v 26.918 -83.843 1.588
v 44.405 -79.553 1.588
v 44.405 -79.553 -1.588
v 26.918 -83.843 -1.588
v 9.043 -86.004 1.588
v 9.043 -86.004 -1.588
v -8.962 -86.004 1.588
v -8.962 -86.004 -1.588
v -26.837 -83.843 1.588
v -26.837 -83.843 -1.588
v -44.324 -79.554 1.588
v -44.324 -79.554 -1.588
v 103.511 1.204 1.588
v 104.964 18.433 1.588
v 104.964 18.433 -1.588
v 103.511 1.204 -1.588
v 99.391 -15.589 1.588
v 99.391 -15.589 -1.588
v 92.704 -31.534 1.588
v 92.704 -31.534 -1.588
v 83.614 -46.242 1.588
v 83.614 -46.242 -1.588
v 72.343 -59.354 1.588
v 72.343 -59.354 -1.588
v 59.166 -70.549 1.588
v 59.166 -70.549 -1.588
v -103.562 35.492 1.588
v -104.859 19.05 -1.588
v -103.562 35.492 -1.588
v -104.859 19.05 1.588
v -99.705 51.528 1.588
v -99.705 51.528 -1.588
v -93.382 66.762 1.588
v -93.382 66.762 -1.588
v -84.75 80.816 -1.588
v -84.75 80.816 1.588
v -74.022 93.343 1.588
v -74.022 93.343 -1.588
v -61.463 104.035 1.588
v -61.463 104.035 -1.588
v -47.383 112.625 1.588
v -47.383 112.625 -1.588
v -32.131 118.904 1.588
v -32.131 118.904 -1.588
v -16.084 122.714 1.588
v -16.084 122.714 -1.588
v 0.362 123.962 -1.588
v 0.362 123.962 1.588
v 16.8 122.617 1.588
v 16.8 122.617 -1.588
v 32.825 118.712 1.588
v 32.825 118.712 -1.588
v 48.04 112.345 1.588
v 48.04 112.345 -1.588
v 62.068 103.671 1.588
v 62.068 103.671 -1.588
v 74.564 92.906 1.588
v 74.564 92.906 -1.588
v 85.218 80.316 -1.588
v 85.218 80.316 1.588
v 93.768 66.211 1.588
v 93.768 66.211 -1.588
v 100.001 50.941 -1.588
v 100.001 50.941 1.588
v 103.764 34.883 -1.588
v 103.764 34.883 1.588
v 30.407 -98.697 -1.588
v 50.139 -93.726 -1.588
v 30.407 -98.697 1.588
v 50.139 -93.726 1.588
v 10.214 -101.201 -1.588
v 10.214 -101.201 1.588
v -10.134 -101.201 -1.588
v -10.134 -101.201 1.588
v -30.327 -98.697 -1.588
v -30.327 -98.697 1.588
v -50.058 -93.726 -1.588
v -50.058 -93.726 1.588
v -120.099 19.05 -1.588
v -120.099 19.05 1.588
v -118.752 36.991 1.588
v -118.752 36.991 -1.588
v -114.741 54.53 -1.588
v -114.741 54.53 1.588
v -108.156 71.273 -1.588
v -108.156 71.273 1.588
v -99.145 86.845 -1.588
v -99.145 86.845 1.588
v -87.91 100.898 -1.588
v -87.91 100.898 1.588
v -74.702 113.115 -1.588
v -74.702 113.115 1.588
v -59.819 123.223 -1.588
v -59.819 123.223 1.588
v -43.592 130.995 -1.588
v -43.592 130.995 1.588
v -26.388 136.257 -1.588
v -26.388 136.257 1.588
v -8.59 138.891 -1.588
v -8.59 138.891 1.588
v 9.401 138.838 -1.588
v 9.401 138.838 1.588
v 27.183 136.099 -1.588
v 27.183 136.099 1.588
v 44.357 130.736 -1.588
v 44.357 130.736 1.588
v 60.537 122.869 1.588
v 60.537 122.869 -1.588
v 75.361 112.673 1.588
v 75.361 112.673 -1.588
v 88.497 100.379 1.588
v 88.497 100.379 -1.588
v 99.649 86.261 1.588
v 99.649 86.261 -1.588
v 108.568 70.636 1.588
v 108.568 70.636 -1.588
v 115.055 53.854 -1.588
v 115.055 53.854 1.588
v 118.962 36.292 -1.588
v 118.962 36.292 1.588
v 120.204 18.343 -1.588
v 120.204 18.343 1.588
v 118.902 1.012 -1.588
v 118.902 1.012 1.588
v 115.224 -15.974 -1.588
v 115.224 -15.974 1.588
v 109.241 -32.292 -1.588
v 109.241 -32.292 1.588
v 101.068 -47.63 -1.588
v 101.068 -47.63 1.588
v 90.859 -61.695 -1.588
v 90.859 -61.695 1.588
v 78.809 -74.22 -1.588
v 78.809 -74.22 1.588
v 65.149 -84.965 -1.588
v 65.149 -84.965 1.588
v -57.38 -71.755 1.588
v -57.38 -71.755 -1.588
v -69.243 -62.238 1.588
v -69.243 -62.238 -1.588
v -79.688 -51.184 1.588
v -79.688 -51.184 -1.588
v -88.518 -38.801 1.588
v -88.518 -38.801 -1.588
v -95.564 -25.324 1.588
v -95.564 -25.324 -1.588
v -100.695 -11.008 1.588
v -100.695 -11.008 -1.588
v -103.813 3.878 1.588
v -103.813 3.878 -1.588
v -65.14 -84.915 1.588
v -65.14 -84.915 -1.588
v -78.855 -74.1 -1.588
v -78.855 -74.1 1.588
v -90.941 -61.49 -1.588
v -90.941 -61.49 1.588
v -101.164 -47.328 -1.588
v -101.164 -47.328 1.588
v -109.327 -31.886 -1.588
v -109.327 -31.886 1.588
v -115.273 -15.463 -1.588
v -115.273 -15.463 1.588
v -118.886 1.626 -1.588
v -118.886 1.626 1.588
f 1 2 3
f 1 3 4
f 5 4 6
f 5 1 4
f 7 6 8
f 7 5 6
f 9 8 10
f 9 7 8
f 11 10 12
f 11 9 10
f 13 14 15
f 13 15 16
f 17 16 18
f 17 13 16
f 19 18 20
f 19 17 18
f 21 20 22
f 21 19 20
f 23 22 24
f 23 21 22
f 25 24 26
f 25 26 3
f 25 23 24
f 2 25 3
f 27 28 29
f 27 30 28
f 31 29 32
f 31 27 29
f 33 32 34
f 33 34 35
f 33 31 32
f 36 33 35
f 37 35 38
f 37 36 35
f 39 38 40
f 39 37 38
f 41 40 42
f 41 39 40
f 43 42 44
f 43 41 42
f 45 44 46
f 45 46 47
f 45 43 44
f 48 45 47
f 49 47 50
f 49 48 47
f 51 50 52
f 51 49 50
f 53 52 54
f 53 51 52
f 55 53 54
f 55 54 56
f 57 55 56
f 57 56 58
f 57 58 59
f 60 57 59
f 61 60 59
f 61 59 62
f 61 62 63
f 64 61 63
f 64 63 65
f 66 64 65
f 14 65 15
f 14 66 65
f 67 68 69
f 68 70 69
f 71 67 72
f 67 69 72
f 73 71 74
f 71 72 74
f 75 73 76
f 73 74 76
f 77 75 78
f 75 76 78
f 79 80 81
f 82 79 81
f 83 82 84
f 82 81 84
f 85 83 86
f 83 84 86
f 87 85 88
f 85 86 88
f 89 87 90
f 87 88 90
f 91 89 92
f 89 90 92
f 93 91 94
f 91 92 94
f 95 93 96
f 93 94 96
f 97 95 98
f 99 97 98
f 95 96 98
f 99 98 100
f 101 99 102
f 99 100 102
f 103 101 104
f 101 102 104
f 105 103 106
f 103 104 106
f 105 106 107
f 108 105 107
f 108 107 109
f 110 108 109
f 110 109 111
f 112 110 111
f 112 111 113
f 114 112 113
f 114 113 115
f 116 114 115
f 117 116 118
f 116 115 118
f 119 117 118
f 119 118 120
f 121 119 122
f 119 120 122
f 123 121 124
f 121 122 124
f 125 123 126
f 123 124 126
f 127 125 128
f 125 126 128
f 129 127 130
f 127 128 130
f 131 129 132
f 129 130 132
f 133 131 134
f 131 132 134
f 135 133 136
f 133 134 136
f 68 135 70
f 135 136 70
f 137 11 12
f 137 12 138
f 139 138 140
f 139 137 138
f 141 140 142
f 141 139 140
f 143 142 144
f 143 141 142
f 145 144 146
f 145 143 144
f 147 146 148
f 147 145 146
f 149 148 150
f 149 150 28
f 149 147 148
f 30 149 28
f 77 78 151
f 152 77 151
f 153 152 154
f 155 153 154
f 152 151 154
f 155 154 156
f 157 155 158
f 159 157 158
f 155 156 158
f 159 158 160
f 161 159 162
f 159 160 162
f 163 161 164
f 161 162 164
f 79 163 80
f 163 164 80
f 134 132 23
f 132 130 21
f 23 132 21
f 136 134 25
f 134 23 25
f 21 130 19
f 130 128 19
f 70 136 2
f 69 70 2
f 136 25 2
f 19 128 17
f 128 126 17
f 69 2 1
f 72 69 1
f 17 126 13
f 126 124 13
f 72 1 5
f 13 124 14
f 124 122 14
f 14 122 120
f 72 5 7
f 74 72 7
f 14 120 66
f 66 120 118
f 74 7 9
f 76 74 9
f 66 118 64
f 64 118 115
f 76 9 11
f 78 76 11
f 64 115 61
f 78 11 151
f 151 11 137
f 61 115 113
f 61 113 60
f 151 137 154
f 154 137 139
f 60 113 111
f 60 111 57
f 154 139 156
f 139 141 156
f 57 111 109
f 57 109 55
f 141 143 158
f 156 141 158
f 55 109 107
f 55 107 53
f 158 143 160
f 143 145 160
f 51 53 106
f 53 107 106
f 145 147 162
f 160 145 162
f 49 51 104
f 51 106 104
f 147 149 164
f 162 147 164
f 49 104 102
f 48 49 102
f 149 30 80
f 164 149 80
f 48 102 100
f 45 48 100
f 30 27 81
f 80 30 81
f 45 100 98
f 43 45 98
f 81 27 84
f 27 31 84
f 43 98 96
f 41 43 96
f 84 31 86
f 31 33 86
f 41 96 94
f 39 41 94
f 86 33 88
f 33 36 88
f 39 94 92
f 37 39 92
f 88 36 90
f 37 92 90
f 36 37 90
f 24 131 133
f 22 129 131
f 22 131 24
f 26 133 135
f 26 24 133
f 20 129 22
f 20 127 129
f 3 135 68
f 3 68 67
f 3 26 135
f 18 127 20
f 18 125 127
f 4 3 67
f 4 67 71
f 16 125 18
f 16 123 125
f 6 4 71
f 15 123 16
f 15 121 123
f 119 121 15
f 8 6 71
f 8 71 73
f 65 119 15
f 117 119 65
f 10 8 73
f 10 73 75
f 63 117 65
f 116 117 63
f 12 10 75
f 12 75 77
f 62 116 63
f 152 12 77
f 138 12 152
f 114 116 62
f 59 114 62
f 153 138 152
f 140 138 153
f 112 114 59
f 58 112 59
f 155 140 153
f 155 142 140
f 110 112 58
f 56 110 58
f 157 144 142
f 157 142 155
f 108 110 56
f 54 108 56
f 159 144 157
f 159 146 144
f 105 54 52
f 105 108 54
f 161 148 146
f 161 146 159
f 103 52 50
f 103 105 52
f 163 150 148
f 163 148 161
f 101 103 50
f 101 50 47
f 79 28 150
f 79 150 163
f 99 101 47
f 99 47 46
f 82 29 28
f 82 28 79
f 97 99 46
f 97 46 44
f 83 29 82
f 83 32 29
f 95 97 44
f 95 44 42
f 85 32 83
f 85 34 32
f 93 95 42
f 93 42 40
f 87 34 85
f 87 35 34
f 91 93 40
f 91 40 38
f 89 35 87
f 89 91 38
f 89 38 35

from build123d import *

# Parameters (mm, degrees)
BOSS_EXTRUDE1_DEPTH = 1.5875


with BuildPart() as part:
    # Sketch2 → Boss-Extrude1 (new, symmetric)
    with BuildSketch(Plane.XY):
        with BuildLine():
            ThreePointArc((-120.098895727, 19.05), (0.406748907, 139.2017743), (120.203613722, 18.343301545))
            ThreePointArc((120.203613722, 18.343301545), (101.067699546, -47.629728931), (50.138751442, -93.726))
            ThreePointArc((50.138751442, -93.726), (0.040174098, -101.514794876), (-50.058403246, -93.726))
            ThreePointArc((-50.058403246, -93.726), (-101.163912713, -47.327889321), (-120.098895727, 19.05))
        make_face()
        with BuildLine():
            ThreePointArc((-104.858895727, 19.05), (0.361930242, 123.961840203), (104.963877332, 18.432938489))
            ThreePointArc((104.963877332, 18.432938489), (88.446745877, -39.065849025), (44.40486057, -79.553359885))
            ThreePointArc((44.40486057, -79.553359885), (0.040463589, -86.274794876), (-44.323959374, -79.553531384))
            ThreePointArc((-44.323959374, -79.553531384), (-88.517658334, -38.801393502), (-104.858895727, 19.05))
        make_face(mode=Mode.SUBTRACT)
    extrude(amount=BOSS_EXTRUDE1_DEPTH, both=True)


solid = part.part
